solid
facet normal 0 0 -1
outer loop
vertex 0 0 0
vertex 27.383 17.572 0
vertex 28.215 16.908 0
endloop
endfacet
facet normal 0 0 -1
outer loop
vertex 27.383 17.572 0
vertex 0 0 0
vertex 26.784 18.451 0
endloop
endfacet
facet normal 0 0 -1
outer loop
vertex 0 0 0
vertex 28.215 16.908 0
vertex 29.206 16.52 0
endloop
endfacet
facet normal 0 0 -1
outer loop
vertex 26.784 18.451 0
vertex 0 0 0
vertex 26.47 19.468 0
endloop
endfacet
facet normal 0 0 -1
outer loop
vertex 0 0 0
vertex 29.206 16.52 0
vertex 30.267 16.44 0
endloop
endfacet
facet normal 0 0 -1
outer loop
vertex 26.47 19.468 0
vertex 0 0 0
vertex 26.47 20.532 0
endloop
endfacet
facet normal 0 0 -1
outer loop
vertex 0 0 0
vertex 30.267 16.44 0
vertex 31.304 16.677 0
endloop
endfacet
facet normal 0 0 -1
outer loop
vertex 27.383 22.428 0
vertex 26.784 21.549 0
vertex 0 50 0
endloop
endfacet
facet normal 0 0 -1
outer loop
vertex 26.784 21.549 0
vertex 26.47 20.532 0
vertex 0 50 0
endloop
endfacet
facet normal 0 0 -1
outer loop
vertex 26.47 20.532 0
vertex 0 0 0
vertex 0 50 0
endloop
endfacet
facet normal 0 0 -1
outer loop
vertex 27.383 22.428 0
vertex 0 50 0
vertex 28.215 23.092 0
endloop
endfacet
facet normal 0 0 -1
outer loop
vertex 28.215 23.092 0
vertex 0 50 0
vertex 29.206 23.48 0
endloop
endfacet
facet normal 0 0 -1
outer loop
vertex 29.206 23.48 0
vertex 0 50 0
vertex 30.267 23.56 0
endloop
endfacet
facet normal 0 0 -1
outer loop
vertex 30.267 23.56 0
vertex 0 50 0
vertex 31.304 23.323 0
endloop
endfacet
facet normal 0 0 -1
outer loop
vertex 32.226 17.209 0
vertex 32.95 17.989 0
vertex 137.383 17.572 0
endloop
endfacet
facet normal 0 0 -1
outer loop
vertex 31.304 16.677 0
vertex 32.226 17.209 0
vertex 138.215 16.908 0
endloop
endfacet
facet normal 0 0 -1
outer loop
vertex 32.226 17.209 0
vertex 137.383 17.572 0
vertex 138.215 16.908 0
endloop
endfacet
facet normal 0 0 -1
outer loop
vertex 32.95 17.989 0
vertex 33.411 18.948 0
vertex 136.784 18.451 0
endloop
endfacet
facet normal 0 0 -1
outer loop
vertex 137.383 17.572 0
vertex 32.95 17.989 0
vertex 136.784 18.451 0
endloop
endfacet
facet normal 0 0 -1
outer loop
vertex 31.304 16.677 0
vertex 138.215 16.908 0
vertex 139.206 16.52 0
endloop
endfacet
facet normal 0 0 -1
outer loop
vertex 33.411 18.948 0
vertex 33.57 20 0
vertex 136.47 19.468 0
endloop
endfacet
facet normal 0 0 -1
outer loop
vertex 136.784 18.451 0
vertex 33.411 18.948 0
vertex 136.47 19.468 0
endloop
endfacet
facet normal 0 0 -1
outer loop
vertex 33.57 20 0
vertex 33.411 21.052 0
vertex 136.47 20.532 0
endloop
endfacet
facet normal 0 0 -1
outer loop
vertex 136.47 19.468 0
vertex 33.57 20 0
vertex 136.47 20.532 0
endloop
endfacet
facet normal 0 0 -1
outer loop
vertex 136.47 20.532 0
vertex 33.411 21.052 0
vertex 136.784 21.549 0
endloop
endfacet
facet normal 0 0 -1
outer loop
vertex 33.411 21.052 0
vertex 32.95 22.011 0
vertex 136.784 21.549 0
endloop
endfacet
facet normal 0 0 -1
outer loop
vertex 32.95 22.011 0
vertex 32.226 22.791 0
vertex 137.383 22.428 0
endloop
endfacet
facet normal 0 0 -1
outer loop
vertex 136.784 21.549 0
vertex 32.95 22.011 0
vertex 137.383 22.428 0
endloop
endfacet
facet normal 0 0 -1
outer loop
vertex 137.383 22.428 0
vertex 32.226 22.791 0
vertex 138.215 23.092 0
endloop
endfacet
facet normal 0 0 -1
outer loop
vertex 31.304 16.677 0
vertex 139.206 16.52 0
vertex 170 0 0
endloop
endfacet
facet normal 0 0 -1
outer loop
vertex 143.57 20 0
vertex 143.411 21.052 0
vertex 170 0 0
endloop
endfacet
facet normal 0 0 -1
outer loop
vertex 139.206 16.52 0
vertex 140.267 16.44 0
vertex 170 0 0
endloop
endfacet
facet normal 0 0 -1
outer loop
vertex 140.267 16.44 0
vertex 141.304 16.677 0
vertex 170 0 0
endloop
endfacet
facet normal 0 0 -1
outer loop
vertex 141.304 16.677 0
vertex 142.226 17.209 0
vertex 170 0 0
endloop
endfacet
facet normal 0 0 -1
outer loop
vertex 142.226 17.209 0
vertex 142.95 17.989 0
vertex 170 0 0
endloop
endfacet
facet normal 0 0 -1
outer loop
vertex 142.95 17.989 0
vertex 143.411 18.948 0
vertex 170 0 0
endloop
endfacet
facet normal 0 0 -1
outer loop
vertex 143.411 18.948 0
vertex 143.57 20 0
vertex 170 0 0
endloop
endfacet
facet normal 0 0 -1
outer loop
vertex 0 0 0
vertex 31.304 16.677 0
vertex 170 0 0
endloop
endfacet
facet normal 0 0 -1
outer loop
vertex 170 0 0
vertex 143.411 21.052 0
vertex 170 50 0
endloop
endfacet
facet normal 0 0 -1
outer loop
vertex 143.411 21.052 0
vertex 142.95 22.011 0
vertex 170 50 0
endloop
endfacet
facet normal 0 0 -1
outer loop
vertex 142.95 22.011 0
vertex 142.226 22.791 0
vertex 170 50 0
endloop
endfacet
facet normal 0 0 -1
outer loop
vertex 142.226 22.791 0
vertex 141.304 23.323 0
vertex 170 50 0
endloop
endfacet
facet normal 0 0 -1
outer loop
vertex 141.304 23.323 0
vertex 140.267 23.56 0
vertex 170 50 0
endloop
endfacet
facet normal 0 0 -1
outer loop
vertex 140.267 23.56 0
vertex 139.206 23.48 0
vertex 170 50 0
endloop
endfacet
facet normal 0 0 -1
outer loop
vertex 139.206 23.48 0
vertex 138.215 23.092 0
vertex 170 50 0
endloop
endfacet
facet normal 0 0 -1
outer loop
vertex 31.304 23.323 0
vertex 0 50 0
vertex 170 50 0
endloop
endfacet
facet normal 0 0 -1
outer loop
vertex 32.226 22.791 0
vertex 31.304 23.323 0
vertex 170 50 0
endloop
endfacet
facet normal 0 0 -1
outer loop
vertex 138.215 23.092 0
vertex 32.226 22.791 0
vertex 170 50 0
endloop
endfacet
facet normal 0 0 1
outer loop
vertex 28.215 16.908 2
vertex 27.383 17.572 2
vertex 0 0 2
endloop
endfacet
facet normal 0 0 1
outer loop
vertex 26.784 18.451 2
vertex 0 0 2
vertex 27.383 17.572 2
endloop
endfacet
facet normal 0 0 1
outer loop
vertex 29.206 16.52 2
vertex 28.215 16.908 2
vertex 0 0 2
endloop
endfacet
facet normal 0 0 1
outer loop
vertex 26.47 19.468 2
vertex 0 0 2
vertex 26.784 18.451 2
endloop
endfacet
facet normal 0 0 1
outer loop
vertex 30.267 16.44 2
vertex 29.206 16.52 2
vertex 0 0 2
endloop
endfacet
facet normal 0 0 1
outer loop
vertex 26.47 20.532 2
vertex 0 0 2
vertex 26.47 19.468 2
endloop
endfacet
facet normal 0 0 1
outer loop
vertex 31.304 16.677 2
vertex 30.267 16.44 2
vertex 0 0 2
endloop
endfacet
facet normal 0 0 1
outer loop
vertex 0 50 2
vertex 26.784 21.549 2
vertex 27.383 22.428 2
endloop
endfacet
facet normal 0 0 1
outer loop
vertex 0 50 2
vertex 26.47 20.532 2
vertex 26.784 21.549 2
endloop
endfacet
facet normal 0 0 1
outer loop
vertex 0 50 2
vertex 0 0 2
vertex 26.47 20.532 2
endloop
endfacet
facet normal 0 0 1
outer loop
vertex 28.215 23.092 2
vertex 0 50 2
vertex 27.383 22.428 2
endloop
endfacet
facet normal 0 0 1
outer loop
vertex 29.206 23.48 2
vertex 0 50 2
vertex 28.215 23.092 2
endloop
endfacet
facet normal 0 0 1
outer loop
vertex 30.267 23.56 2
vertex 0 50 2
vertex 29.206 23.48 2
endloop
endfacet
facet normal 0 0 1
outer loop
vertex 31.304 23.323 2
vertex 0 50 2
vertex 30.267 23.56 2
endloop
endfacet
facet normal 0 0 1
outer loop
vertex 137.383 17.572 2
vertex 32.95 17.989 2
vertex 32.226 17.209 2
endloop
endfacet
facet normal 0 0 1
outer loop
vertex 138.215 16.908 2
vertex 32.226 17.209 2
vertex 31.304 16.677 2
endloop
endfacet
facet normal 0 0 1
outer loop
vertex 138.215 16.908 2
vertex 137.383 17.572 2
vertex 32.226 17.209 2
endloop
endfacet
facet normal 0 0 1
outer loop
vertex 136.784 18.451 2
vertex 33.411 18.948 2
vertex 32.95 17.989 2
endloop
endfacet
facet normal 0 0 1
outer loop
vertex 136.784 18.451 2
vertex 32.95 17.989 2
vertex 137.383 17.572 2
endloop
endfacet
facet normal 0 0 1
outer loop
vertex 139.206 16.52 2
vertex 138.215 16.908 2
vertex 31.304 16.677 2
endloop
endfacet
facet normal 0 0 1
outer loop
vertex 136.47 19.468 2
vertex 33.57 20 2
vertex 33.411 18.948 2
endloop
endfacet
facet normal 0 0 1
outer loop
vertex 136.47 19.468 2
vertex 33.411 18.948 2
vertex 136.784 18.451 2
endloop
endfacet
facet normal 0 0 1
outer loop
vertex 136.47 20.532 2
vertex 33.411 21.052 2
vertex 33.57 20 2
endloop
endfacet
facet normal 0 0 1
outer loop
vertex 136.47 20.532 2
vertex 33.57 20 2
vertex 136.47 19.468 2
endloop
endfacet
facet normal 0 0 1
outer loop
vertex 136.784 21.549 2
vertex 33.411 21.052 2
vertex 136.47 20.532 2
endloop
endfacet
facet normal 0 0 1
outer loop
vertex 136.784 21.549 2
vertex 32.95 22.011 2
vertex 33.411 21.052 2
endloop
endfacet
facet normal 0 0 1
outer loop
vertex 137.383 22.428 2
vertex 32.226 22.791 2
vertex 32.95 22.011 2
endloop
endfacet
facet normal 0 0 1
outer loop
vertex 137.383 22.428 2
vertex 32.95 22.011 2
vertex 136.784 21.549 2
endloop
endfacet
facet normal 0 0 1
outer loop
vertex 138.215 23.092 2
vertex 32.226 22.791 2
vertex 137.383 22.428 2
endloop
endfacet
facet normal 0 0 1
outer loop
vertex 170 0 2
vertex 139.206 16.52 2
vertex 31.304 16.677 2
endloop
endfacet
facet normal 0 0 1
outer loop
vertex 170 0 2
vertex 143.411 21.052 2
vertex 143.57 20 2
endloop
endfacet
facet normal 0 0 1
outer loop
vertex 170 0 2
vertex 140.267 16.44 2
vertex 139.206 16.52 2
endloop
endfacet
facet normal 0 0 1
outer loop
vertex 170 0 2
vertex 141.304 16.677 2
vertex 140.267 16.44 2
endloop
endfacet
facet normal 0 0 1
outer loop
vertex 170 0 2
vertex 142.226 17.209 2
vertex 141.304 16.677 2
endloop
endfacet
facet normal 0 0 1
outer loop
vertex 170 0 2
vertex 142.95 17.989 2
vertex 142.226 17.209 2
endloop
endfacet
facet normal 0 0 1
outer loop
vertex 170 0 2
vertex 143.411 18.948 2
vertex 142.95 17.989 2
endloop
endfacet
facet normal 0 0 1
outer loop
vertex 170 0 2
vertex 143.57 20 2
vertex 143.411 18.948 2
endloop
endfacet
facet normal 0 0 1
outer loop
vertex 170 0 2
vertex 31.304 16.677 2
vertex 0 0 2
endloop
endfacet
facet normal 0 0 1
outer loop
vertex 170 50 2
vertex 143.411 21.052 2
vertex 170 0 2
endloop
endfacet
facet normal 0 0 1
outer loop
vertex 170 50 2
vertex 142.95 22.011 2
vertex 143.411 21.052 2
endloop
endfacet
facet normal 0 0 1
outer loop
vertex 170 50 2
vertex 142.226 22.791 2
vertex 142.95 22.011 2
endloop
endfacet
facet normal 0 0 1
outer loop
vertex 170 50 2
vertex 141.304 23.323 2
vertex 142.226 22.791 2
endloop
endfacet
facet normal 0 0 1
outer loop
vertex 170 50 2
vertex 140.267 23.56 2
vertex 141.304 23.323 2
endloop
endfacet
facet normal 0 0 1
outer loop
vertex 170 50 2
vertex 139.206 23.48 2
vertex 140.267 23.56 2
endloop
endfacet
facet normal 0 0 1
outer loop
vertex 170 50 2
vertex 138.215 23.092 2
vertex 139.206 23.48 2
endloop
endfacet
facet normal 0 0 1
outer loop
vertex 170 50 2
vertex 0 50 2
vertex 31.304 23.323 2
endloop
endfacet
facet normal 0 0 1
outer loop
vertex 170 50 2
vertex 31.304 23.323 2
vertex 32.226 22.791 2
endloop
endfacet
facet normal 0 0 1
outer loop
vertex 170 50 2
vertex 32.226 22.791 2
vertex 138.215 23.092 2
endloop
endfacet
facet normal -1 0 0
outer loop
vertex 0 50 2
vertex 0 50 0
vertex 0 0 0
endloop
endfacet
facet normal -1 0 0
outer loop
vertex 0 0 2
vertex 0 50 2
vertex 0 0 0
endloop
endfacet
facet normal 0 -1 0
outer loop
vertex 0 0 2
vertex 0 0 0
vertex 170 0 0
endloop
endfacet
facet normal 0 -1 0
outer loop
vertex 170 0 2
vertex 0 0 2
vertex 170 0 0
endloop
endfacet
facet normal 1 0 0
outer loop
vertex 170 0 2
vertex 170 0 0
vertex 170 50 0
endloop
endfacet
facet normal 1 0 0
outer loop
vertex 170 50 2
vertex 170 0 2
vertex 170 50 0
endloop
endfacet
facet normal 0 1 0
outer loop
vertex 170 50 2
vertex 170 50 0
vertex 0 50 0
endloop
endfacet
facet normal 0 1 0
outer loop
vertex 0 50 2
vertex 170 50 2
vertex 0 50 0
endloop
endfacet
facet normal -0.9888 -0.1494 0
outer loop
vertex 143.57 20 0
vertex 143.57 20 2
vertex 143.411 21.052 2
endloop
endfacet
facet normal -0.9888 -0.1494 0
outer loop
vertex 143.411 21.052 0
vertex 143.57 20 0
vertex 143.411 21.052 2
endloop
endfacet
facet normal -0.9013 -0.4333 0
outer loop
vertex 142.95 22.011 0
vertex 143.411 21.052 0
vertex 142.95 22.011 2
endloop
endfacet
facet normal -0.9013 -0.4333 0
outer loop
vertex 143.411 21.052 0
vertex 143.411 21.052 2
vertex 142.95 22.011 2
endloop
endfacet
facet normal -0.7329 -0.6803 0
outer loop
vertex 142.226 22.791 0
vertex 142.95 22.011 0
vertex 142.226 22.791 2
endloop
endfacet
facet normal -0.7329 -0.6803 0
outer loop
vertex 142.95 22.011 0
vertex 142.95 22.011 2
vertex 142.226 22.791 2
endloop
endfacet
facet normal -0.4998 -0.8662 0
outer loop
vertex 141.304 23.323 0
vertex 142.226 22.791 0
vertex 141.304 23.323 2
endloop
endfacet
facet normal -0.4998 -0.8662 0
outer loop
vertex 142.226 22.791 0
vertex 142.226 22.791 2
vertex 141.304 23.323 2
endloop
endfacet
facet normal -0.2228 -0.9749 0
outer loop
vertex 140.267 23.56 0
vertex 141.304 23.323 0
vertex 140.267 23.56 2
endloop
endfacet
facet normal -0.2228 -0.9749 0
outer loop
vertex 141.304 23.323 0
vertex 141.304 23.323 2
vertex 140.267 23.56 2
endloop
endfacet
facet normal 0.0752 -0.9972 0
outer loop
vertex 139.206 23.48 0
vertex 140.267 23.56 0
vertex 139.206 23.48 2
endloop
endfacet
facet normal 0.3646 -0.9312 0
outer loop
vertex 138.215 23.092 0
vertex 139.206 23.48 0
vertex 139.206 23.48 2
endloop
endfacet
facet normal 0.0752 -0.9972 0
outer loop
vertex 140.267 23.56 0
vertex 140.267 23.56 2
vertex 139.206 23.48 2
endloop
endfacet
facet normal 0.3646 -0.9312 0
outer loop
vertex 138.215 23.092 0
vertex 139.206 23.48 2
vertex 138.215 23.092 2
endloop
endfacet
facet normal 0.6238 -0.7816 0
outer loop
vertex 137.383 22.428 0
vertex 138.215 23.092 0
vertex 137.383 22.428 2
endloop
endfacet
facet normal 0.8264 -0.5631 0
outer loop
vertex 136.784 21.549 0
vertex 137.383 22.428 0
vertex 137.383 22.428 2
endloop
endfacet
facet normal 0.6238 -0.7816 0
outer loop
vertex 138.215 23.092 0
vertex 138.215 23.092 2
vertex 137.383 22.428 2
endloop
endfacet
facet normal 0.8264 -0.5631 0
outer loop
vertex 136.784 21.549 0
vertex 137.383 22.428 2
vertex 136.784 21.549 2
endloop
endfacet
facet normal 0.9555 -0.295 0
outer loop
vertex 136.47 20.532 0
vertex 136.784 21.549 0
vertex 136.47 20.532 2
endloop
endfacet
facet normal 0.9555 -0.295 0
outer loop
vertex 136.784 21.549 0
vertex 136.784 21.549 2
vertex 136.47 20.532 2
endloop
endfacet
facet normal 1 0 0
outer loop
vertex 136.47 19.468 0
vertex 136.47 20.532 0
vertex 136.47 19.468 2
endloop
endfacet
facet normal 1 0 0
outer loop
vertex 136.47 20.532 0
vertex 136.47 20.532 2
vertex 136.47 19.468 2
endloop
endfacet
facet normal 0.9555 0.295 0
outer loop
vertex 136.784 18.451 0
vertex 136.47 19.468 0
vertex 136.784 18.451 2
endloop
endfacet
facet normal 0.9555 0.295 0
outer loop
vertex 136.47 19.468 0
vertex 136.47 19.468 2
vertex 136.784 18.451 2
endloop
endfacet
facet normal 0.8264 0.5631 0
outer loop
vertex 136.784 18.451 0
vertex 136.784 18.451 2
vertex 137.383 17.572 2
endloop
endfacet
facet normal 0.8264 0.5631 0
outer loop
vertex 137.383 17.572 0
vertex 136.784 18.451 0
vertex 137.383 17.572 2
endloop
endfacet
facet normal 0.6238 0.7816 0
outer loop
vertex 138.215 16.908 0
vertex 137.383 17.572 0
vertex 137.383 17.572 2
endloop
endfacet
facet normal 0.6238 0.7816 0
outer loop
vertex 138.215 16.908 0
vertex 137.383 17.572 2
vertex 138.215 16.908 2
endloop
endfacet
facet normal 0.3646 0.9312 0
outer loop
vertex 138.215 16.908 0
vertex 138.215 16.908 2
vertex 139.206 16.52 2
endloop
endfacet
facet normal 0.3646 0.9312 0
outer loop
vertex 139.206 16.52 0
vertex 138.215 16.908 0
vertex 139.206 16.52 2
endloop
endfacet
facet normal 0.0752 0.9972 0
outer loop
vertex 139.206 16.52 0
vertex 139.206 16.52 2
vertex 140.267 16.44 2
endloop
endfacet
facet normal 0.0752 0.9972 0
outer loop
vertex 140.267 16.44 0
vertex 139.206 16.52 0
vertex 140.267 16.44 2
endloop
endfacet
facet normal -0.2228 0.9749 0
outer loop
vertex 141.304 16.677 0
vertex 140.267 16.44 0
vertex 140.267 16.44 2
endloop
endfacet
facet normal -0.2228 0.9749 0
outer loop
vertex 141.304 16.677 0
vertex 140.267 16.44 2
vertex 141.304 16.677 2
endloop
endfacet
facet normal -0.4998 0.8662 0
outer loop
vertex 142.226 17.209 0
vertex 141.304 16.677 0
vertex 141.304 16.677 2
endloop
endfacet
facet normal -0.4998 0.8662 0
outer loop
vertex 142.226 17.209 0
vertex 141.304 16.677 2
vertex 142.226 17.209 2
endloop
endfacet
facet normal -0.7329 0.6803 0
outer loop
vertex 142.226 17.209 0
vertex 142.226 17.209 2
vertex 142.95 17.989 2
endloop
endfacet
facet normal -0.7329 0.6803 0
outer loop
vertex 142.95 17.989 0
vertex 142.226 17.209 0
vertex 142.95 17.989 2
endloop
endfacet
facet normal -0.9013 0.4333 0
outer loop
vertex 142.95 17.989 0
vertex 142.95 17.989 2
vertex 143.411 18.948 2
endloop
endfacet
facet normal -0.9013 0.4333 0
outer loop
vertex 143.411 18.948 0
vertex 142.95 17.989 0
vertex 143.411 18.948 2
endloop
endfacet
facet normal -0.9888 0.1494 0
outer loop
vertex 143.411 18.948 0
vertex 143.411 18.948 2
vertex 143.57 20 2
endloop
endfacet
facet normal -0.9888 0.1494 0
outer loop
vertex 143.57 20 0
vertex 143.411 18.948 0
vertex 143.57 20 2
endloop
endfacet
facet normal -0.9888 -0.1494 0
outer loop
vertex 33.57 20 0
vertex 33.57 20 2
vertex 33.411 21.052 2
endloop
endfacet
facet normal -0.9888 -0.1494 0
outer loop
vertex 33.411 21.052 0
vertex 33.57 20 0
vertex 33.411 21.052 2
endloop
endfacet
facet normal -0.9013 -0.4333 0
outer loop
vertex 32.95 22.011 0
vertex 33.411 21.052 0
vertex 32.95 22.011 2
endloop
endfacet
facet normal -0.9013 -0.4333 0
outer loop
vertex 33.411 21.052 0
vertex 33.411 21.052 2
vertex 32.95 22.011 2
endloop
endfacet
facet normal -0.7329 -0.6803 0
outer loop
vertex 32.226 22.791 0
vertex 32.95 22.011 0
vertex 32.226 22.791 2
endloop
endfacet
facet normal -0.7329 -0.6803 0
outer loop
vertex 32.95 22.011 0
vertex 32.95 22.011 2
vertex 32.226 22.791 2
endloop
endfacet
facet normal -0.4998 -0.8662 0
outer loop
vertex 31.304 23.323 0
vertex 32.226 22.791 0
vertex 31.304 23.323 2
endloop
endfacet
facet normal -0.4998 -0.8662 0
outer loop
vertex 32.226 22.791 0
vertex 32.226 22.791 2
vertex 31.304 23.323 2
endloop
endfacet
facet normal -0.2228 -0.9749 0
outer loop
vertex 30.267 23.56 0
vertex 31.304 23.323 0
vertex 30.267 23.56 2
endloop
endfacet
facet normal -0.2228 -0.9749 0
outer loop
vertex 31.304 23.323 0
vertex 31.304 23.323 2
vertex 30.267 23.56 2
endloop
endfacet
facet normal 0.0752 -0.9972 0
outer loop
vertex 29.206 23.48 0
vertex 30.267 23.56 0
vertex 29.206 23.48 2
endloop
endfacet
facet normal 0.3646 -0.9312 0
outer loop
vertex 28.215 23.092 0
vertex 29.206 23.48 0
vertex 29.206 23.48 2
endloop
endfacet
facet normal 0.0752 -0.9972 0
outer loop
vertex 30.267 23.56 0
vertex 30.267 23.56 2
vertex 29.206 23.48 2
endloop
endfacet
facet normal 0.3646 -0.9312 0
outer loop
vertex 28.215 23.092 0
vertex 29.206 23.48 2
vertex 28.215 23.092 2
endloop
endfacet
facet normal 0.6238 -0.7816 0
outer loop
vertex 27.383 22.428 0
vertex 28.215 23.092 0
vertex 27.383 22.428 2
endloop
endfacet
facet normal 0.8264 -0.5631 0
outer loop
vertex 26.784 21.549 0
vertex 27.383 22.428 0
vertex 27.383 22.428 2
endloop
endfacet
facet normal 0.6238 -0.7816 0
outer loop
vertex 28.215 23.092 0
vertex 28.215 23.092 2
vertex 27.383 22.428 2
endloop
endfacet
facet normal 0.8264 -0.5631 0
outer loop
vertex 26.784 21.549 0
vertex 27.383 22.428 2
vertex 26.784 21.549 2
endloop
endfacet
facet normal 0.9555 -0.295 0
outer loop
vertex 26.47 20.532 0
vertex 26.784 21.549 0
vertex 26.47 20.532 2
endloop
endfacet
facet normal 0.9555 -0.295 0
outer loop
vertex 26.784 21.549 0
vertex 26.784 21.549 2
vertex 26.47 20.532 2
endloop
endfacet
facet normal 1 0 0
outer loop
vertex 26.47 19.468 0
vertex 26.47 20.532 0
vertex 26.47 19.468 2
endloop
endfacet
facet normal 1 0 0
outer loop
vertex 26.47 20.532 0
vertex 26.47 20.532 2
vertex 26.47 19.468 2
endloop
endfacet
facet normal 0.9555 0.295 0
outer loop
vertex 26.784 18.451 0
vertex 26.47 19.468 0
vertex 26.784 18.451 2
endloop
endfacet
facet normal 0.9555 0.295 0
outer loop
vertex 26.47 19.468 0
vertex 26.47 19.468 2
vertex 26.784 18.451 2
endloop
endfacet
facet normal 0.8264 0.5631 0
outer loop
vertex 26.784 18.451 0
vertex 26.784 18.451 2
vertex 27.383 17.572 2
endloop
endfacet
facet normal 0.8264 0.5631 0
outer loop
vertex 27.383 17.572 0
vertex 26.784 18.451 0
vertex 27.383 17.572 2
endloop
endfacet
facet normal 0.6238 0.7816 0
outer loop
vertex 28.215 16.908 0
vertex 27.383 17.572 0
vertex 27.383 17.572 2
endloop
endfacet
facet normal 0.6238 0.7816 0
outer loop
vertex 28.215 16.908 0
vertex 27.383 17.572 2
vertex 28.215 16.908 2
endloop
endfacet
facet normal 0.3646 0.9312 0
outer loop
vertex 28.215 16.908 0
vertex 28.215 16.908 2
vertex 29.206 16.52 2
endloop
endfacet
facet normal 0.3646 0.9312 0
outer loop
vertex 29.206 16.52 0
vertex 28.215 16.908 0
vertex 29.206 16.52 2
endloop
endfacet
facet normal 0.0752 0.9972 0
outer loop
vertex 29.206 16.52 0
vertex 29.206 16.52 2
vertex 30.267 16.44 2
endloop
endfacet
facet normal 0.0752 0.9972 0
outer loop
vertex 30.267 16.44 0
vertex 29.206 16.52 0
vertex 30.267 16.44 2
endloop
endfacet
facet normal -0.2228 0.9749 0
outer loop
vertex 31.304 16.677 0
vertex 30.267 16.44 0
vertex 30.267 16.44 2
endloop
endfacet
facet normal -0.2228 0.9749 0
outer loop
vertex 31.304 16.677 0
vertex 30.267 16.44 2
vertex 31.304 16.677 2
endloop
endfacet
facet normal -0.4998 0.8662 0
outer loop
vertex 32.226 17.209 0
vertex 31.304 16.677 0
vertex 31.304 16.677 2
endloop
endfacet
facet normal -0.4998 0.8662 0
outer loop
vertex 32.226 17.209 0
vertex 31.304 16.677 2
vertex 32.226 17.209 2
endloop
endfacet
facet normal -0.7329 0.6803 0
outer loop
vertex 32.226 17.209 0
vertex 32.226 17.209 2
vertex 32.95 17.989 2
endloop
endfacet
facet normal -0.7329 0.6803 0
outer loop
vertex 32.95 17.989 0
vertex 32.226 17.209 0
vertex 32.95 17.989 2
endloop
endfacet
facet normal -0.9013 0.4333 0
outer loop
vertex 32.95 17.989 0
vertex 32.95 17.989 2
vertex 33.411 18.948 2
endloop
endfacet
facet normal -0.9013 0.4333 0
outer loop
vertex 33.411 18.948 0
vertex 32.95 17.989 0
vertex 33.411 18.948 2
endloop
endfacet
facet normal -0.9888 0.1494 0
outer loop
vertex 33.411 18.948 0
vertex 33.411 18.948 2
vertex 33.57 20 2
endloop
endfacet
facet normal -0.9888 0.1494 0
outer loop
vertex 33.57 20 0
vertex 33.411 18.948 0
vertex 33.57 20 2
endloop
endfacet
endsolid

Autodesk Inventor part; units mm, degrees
ref_plane "YZ Plane" through (0, 0, 0) normal (1, 0, 0) x (0, 1, 0)
ref_plane "XZ Plane" through (0, 0, 0) normal (0, 1, 0) x (-1, 0, 0)
ref_plane "XY Plane" through (0, 0, 0) normal (0, 0, 1) x (1, 0, 0)
sketch "Sketch1" plane through (0, 0, 0) normal (0, 0, 1) x (1, 0, 0)
  line L0 (0, 0) -> (170, 0)
  line L1 (170, 0) -> (170, 50)
  line L2 (170, 50) -> (0, 50)
  line L3 (0, 50) -> (0, 0)
  dimension "d0" = 170
  dimension "d1" = 50
extrude "Extrusion1" add sketch "Sketch1" along normal blind 2
sketch "Sketch2" plane through (0, 0, 2) normal (0, 0, 1) x (1, 0, 0)
  circle A0 centre (30, 20) radius 3.57
  circle A1 centre (140, 20) radius 3.57
  line L0 (0, 0) -> (170, 0) projected
  line L1 (0, 50) -> (0, 0) projected
  line L2 (170, 0) -> (170, 50) projected
  dimension "d4" = 7.14
  dimension "d5" = 7.14
  dimension "d6" = 20
  dimension "d7" = 30
  dimension "d8" = 30
  dimension "d9" = 20
extrude "Extrusion2" cut sketch "Sketch2" against normal up to next
properties part number "Panel_5x17cm"
